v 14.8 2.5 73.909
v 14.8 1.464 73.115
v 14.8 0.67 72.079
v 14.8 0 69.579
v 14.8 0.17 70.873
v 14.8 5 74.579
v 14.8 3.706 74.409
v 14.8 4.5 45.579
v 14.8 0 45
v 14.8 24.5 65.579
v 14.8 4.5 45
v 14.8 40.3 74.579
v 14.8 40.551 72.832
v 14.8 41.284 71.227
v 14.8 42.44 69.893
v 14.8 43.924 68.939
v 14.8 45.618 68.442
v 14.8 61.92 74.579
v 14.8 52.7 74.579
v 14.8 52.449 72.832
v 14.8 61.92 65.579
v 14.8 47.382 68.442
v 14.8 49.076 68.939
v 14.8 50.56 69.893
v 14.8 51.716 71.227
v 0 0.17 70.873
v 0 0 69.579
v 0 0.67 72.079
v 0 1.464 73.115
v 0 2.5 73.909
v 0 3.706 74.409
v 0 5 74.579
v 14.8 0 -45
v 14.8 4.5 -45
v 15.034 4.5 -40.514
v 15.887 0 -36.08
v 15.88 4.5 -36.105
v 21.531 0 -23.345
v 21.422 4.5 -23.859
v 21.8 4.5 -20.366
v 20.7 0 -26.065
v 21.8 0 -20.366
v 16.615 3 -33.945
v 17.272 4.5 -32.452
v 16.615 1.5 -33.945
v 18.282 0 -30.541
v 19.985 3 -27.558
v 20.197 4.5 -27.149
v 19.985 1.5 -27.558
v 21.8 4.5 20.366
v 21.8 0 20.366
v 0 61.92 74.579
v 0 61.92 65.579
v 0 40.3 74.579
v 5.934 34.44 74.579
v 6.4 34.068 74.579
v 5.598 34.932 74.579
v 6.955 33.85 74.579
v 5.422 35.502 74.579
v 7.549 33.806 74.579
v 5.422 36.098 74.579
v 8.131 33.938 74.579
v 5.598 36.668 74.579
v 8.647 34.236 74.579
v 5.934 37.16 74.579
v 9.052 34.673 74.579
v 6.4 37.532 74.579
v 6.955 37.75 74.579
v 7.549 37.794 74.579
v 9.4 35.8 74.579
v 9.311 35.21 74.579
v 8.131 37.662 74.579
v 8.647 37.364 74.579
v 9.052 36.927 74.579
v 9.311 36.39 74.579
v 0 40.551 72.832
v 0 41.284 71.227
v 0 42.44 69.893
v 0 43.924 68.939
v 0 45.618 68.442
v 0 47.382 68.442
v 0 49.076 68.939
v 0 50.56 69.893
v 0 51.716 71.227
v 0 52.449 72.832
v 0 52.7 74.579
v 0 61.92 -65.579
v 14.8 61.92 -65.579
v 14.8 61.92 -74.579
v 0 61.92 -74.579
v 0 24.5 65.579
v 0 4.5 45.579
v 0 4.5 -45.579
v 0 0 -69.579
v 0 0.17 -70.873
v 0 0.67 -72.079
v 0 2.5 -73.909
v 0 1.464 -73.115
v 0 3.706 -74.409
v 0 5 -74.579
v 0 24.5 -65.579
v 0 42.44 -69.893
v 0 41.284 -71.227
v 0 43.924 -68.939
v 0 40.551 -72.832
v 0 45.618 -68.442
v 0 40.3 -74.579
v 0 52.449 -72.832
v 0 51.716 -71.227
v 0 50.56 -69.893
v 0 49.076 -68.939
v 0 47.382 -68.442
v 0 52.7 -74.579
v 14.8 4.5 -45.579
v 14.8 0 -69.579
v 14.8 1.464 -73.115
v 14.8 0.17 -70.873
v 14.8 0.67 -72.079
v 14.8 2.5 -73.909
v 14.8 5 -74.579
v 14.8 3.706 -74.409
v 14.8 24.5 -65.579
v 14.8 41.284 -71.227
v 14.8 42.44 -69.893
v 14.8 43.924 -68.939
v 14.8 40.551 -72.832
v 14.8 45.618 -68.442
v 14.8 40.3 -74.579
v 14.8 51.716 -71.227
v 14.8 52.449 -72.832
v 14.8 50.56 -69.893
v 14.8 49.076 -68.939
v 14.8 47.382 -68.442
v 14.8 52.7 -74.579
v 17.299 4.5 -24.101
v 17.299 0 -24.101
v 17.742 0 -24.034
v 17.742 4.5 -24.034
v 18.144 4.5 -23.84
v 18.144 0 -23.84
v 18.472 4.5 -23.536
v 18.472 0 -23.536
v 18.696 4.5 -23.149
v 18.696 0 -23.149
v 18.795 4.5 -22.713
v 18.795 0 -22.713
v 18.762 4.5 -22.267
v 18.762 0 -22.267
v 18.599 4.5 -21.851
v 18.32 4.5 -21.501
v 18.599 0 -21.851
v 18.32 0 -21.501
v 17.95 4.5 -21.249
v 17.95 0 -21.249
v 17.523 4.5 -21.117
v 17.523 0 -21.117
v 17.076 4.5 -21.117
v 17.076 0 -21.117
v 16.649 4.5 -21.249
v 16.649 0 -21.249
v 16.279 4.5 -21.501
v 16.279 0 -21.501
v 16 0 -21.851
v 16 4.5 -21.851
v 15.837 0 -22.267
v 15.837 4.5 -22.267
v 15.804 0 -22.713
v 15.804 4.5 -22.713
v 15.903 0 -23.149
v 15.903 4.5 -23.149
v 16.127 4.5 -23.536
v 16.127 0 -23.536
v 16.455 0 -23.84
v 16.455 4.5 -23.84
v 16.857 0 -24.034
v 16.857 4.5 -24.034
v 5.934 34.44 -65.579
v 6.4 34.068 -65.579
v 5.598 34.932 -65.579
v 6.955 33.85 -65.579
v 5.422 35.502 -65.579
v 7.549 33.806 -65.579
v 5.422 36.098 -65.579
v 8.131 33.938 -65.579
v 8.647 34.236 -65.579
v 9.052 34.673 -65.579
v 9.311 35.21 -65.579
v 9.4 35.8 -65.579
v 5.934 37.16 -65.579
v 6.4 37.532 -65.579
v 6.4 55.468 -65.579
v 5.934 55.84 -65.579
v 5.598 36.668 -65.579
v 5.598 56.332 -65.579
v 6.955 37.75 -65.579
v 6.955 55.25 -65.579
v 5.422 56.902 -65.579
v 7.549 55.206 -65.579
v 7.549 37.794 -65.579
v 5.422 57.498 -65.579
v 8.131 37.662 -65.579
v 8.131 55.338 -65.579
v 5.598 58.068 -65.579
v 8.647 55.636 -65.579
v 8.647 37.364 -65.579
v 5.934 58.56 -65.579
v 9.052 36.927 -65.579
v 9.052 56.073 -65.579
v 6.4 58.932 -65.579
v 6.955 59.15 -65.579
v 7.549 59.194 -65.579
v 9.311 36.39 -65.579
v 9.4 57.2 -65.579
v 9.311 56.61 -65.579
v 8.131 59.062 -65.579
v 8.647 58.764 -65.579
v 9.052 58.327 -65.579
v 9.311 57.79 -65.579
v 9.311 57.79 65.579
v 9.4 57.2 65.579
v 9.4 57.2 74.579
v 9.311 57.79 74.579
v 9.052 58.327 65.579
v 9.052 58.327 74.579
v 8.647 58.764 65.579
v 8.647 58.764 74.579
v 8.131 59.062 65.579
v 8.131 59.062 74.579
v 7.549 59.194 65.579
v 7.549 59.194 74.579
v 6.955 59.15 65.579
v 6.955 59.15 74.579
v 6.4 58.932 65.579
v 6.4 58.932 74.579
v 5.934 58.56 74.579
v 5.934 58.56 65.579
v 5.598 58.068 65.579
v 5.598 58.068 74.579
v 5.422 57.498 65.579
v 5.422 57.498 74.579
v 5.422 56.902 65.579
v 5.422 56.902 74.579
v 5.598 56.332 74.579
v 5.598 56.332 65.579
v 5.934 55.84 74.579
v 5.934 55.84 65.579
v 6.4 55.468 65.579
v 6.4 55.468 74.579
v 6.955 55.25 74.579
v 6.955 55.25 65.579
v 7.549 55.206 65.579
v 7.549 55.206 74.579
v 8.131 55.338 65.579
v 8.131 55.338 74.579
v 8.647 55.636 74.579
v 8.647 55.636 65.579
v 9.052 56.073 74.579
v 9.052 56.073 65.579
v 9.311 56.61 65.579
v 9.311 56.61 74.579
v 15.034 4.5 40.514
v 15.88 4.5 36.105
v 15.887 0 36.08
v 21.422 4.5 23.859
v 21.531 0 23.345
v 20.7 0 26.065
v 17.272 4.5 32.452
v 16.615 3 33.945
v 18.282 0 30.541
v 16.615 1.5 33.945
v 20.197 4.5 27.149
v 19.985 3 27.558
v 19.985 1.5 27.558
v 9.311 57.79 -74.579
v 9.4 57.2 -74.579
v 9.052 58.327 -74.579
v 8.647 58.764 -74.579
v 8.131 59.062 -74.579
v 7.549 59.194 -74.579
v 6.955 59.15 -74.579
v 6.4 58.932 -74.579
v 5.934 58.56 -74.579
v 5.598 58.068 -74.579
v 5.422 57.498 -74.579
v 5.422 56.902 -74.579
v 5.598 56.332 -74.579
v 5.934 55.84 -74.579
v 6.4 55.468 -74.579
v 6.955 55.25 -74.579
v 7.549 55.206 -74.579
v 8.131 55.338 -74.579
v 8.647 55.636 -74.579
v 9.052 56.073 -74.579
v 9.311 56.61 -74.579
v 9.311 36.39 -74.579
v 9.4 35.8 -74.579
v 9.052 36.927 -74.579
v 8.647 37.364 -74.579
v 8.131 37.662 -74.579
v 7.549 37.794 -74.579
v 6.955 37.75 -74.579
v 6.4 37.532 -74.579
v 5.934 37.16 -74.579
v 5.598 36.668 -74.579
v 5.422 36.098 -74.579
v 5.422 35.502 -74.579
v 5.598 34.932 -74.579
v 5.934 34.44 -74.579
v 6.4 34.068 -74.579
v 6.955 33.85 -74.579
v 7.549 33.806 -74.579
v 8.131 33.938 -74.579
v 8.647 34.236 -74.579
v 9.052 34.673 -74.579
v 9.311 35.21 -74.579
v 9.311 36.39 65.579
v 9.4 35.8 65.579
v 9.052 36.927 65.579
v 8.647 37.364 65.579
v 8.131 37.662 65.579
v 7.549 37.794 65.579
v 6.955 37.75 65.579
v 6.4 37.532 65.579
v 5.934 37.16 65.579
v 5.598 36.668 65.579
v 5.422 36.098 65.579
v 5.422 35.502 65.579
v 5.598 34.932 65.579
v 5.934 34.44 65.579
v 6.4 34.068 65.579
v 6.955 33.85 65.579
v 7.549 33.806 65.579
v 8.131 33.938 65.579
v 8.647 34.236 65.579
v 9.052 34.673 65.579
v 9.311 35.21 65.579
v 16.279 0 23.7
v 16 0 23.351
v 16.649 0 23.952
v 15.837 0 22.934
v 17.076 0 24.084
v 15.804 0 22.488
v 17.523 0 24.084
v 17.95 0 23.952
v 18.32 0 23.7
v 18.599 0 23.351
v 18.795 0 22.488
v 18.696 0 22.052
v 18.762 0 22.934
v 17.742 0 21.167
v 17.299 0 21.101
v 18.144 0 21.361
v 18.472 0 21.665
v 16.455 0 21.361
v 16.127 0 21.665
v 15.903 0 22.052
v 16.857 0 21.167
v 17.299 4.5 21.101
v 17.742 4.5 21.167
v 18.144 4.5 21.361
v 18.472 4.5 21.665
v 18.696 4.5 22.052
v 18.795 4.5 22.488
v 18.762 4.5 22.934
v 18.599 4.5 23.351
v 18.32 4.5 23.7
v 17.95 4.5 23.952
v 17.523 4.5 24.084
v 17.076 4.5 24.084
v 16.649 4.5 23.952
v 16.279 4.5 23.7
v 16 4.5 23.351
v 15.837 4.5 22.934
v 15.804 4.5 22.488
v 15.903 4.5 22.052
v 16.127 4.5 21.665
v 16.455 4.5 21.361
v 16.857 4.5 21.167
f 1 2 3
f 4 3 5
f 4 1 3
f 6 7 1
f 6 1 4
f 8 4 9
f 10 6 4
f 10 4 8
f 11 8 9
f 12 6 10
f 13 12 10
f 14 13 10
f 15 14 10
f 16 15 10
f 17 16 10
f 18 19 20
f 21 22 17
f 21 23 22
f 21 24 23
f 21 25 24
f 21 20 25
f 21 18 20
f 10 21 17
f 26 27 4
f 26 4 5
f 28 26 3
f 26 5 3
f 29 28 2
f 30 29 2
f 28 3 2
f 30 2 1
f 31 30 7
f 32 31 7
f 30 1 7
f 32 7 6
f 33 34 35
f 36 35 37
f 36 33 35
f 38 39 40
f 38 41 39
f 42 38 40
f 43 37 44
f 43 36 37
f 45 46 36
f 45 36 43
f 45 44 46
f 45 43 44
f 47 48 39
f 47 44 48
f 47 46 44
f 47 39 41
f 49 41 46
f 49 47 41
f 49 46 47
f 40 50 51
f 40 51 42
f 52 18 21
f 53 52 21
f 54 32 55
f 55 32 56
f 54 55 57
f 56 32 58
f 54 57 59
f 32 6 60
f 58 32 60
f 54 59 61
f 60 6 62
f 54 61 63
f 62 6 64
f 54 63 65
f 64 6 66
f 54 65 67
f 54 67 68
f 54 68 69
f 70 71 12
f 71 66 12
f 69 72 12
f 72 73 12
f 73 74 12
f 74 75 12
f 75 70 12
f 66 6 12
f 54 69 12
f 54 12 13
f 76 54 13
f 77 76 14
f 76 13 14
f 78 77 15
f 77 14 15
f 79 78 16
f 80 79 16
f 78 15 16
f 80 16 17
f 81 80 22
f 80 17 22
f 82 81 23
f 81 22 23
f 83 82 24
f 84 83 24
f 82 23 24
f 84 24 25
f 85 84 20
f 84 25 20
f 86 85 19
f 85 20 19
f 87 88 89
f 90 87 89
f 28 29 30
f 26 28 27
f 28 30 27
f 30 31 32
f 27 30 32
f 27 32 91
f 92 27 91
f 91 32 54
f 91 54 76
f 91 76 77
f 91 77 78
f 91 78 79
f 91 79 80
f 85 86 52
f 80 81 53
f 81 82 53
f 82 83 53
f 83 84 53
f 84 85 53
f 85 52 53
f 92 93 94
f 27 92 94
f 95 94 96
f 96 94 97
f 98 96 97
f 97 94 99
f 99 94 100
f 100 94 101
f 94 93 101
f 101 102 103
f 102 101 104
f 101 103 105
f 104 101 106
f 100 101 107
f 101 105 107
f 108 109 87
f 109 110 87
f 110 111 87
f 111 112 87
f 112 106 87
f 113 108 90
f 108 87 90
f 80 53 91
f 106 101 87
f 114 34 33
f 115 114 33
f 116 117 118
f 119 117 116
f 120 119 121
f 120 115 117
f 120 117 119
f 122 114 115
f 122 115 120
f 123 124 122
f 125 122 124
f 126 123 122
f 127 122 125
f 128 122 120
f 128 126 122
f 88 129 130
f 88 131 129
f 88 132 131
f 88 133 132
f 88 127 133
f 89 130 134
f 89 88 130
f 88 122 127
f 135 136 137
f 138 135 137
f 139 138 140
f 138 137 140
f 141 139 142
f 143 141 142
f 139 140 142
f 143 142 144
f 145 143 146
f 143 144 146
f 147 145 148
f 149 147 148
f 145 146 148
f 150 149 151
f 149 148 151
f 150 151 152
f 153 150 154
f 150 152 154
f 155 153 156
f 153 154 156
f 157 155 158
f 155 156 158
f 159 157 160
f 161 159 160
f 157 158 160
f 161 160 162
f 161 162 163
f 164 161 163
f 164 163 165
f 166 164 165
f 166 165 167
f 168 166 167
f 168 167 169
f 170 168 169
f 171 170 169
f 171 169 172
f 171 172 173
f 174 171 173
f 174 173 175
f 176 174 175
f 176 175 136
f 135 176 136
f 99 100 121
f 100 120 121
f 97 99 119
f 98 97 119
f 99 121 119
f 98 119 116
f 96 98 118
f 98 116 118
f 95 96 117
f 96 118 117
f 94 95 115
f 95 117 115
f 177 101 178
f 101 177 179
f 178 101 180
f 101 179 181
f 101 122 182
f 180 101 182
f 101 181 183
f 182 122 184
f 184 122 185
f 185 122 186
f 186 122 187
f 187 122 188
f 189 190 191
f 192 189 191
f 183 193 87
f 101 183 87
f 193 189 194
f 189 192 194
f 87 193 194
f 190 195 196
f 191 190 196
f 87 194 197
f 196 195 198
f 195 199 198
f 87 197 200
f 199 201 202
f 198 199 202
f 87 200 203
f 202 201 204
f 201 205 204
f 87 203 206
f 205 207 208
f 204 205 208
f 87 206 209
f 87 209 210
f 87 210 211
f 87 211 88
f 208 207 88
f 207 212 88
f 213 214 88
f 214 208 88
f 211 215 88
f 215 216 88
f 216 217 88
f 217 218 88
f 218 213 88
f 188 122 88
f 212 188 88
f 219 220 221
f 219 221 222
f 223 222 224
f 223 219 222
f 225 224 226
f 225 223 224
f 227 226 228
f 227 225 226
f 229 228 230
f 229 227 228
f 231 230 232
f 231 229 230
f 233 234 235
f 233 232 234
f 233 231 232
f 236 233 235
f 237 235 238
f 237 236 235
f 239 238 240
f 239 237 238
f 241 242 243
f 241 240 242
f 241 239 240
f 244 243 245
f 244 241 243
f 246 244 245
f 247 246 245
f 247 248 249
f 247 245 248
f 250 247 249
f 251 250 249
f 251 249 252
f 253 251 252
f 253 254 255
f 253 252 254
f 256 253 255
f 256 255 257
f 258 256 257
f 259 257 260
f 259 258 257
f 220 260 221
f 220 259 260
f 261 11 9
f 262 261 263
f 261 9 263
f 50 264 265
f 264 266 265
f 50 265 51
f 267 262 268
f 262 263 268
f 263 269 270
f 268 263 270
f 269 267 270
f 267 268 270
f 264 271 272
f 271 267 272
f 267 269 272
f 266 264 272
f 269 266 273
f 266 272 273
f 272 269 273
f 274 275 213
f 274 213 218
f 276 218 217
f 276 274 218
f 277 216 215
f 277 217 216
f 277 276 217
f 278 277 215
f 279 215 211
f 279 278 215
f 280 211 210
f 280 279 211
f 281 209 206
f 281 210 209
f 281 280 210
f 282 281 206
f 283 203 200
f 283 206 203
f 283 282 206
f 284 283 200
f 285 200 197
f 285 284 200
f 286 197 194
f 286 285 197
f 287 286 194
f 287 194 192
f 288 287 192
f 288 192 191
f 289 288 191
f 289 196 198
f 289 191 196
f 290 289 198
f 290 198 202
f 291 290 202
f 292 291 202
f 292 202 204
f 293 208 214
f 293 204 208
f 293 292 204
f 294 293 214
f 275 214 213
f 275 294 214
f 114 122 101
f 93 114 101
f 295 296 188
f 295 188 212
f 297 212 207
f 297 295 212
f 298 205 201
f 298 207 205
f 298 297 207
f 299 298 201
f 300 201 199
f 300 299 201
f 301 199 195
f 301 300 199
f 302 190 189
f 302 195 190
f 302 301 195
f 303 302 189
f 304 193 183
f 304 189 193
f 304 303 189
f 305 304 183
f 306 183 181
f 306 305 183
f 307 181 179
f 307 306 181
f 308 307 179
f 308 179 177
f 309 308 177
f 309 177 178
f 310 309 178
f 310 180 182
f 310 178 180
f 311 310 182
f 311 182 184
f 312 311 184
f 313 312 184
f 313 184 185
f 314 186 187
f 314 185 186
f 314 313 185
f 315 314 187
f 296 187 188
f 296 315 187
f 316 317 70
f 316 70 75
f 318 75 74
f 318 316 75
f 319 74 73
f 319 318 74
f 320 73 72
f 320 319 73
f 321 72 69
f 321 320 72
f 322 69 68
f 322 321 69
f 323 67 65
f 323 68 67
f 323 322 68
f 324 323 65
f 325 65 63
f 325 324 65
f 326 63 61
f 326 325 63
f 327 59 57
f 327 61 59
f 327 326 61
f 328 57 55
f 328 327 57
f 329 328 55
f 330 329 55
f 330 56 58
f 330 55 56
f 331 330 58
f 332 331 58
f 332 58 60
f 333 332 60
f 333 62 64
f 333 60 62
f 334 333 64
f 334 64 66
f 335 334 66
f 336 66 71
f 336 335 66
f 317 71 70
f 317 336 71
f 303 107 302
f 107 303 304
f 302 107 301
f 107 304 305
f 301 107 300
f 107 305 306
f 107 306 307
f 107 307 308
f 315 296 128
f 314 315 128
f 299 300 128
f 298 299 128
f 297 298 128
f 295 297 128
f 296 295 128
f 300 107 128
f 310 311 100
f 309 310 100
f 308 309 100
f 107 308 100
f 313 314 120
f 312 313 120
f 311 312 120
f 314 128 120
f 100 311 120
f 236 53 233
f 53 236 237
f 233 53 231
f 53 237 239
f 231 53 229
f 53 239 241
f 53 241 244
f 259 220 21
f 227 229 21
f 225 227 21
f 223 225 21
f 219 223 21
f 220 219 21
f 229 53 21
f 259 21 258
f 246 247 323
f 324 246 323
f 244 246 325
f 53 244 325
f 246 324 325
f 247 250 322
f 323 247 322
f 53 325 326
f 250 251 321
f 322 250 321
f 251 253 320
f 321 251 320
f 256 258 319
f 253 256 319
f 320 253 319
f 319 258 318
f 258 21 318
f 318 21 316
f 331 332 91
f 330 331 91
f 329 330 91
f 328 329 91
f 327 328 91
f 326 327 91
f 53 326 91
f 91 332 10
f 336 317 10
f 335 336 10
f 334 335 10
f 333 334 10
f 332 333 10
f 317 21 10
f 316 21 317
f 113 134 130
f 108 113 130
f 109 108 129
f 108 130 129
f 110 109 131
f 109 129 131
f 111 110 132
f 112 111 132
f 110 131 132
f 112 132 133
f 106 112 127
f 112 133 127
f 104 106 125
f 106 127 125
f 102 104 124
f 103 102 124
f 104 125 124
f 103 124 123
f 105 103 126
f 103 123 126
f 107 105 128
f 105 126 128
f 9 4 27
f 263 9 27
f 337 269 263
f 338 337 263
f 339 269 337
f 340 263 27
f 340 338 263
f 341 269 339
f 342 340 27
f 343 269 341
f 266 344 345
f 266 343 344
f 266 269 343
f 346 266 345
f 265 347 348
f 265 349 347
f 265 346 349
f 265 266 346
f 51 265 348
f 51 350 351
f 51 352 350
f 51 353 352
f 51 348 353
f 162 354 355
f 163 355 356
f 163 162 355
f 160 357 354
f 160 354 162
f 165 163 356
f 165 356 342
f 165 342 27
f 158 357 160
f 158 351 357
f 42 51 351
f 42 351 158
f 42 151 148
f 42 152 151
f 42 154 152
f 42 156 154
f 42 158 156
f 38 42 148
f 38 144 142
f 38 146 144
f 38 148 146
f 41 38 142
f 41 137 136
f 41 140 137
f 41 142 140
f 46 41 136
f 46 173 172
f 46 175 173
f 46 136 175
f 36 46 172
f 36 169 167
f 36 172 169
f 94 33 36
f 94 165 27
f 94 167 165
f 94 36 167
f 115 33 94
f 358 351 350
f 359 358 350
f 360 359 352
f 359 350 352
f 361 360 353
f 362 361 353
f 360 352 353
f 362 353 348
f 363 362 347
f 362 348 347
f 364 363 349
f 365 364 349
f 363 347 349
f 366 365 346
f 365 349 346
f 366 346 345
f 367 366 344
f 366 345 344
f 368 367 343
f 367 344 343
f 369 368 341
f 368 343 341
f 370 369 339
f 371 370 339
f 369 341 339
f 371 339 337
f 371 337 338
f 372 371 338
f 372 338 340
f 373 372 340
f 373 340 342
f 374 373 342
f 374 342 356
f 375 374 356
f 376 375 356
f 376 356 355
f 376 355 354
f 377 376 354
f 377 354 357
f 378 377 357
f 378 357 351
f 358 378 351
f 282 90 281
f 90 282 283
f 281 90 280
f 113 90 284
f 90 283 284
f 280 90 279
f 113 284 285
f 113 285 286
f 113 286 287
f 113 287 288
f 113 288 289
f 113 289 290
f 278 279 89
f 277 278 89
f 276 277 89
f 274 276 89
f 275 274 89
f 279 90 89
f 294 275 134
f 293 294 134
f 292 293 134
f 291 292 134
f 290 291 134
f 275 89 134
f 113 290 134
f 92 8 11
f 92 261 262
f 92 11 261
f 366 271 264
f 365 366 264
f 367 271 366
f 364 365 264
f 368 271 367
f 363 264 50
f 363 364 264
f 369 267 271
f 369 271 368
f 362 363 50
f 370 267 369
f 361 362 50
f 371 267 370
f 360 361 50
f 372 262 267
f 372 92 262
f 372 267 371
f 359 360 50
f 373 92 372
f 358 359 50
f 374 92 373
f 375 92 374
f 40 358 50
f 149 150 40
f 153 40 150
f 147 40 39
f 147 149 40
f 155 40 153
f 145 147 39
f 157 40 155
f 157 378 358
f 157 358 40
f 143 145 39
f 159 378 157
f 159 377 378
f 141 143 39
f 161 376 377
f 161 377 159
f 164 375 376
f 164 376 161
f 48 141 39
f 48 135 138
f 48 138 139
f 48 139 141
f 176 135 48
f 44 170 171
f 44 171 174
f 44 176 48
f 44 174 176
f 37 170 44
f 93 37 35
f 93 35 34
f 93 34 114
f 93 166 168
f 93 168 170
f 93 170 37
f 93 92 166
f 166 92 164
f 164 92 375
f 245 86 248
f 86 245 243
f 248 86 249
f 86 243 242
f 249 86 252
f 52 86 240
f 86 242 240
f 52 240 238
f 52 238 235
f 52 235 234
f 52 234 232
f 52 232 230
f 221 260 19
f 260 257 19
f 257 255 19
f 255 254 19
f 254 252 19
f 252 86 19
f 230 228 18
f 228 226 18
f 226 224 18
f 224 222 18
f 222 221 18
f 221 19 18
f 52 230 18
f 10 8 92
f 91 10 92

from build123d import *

# Parameters (mm, degrees)
SKETCH2_W               = 180
SKETCH2_H               = 9
BOSS_EXTRUDE1_DEPTH     = 14.8
SKETCH7_W               = 180
SKETCH7_H               = 4.5
CUT_EXTRUDE1_DEPTH      = 92.319713096
SKETCH8_W               = 90
SKETCH8_H               = 4.5
BOSS_EXTRUDE2_DEPTH     = 7
SKETCH10_R              = 1.5
CUT_EXTRUDE2_DEPTH      = 8
BOSS_EXTRUDE3_DEPTH     = 14.8
CUT_EXTRUDE3_DEPTH      = 178.187961437
CUT_EXTRUDE3_DEPTH_BACK = 178.187961437
SKETCH12_R              = 2
CUT_EXTRUDE4_DEPTH      = 112.397156258
CUT_EXTRUDE4_DEPTH_BACK = 112.397156258
SKETCH13_W              = 26.348017916
SKETCH13_H              = 14.929639375
FILLET2_R               = 5
CHAMFER1_SIZE           = 20


with BuildPart() as part:
    # Sketch2 → Boss-Extrude1 (new body)
    with BuildSketch(Plane(origin=(0, 0, 0), x_dir=(0, 0, -1), z_dir=(1, 0, 0))):
        Rectangle(SKETCH2_W, SKETCH2_H)
    extrude(amount=BOSS_EXTRUDE1_DEPTH)

    # Sketch7 → Cut-Extrude1 (cut, through all)
    with BuildSketch(Plane(origin=(14.8, 0, 0), x_dir=(0, 0, -1), z_dir=(1, 0, 0))):
        with Locations((0, -2.25)):
            Rectangle(SKETCH7_W, SKETCH7_H)
    extrude(amount=-CUT_EXTRUDE1_DEPTH, mode=Mode.SUBTRACT)

    # Sketch8 → Boss-Extrude2 (add)
    with BuildSketch(Plane(origin=(14.8, 0, 0), x_dir=(0, 0, -1), z_dir=(1, 0, 0))):
        with Locations((0, 2.25)):
            Rectangle(SKETCH8_W, SKETCH8_H)
    extrude(amount=BOSS_EXTRUDE2_DEPTH)

    # Sketch10 → Cut-Extrude2 (cut)
    with BuildSketch(Plane.XZ):
        with Locations(Location((17.299494937, -22.600505063, 0), (0, 0, 270))):
            Circle(SKETCH10_R)
        with Locations(Location((17.299494937, 22.600505063, 0), (0, 0, 270))):
            Circle(SKETCH10_R)
        with BuildLine():
            Line((21.8, -20.3664278), (30.172283889, -20.3664278))
            Line((30.172283889, -20.3664278), (30.172283889, -52.03884906))
            Line((30.172283889, -52.03884906), (14.8, -52.03884906))
            Line((14.8, -52.03884906), (14.8, -45))
            add(Edge.make_bspline(
                [(14.8, -45), (14.8, -29.785835575), (21.8, -29.785835575), (21.8, -20.3664278)],
                knots=[0, 0, 0, 0, 1, 1, 1, 1], degree=3))
        make_face()
        with BuildLine():
            Line((30.172283889, 52.03884906), (14.8, 52.03884906))
            Line((14.8, 52.03884906), (14.8, 45))
            add(Edge.make_bspline(
                [(14.8, 45), (14.8, 29.785835575), (21.8, 29.785835575), (21.8, 20.3664278)],
                knots=[0, 0, 0, 0, 1, 1, 1, 1], degree=3))
            Line((21.8, 20.3664278), (30.172283889, 20.3664278))
            Line((30.172283889, 20.3664278), (30.172283889, 52.03884906))
        make_face()
    extrude(amount=-CUT_EXTRUDE2_DEPTH, mode=Mode.SUBTRACT)

    # Sketch11 → Boss-Extrude3 (add)
    with BuildSketch(Plane(origin=(14.8, 0, 0), x_dir=(0, 0, -1), z_dir=(1, 0, 0))):
        with BuildLine():
            Line((74.579, 40.3), (74.579, 4.5))
            Line((74.579, 4.5), (65.579, 4.5))
            Line((65.579, 4.5), (65.579, 46.5))
            Line((65.579, 46.5), (65.579, 61.92))
            Line((65.579, 61.92), (74.579, 61.92))
            Line((74.579, 61.92), (74.579, 52.7))
            ThreePointArc((74.579, 52.7), (68.379, 46.5), (74.579, 40.3))
        make_face()
        with BuildLine():
            Line((-74.579, 52.7), (-74.579, 61.92))
            Line((-74.579, 61.92), (-65.579, 61.92))
            Line((-65.579, 61.92), (-65.579, 46.5))
            Line((-65.579, 46.5), (-65.579, 4.5))
            Line((-65.579, 4.5), (-74.579, 4.5))
            Line((-74.579, 4.5), (-74.579, 40.3))
            ThreePointArc((-74.579, 40.3), (-68.379, 46.5), (-74.579, 52.7))
        make_face()
    extrude(amount=-BOSS_EXTRUDE3_DEPTH)

    # Sketch12 → Cut-Extrude3 (cut, two sides: drawn at the far end of the back side and taken through both)
    with BuildSketch(Plane.XY.offset(74.579).offset(-CUT_EXTRUDE3_DEPTH_BACK)):
        with Locations((7.4, 57.2)):
            Circle(SKETCH12_R)
        with Locations((7.4, 35.8)):
            Circle(SKETCH12_R)
    extrude(amount=CUT_EXTRUDE3_DEPTH + CUT_EXTRUDE3_DEPTH_BACK, mode=Mode.SUBTRACT)

    # Sketch13 → Cut-Extrude4 (cut, two sides: drawn at the far end of the back side and taken through both)
    with BuildSketch(Plane.ZY.offset(-CUT_EXTRUDE4_DEPTH_BACK)):
        with Locations((87.753008958, -2.964819688)):
            Rectangle(SKETCH13_W, SKETCH13_H)
        with Locations((-87.753008958, -2.964819688)):
            Rectangle(SKETCH13_W, SKETCH13_H)
    extrude(amount=CUT_EXTRUDE4_DEPTH + CUT_EXTRUDE4_DEPTH_BACK, mode=Mode.SUBTRACT)

    # Fillet2
    fillet2_edges = [part.edges().sort_by_distance(p)[0] for p in [
        (7.4, 0, -74.579),
        (7.4, 0, 74.579),
    ]]
    fillet(fillet2_edges, radius=FILLET2_R)

    # Chamfer1
    chamfer1_edges = [part.edges().sort_by_distance(p)[0] for p in [
        (7.4, 4.5, 65.579),
        (7.4, 4.5, -65.579),
    ]]
    chamfer(chamfer1_edges, length=CHAMFER1_SIZE)


solid = part.part
